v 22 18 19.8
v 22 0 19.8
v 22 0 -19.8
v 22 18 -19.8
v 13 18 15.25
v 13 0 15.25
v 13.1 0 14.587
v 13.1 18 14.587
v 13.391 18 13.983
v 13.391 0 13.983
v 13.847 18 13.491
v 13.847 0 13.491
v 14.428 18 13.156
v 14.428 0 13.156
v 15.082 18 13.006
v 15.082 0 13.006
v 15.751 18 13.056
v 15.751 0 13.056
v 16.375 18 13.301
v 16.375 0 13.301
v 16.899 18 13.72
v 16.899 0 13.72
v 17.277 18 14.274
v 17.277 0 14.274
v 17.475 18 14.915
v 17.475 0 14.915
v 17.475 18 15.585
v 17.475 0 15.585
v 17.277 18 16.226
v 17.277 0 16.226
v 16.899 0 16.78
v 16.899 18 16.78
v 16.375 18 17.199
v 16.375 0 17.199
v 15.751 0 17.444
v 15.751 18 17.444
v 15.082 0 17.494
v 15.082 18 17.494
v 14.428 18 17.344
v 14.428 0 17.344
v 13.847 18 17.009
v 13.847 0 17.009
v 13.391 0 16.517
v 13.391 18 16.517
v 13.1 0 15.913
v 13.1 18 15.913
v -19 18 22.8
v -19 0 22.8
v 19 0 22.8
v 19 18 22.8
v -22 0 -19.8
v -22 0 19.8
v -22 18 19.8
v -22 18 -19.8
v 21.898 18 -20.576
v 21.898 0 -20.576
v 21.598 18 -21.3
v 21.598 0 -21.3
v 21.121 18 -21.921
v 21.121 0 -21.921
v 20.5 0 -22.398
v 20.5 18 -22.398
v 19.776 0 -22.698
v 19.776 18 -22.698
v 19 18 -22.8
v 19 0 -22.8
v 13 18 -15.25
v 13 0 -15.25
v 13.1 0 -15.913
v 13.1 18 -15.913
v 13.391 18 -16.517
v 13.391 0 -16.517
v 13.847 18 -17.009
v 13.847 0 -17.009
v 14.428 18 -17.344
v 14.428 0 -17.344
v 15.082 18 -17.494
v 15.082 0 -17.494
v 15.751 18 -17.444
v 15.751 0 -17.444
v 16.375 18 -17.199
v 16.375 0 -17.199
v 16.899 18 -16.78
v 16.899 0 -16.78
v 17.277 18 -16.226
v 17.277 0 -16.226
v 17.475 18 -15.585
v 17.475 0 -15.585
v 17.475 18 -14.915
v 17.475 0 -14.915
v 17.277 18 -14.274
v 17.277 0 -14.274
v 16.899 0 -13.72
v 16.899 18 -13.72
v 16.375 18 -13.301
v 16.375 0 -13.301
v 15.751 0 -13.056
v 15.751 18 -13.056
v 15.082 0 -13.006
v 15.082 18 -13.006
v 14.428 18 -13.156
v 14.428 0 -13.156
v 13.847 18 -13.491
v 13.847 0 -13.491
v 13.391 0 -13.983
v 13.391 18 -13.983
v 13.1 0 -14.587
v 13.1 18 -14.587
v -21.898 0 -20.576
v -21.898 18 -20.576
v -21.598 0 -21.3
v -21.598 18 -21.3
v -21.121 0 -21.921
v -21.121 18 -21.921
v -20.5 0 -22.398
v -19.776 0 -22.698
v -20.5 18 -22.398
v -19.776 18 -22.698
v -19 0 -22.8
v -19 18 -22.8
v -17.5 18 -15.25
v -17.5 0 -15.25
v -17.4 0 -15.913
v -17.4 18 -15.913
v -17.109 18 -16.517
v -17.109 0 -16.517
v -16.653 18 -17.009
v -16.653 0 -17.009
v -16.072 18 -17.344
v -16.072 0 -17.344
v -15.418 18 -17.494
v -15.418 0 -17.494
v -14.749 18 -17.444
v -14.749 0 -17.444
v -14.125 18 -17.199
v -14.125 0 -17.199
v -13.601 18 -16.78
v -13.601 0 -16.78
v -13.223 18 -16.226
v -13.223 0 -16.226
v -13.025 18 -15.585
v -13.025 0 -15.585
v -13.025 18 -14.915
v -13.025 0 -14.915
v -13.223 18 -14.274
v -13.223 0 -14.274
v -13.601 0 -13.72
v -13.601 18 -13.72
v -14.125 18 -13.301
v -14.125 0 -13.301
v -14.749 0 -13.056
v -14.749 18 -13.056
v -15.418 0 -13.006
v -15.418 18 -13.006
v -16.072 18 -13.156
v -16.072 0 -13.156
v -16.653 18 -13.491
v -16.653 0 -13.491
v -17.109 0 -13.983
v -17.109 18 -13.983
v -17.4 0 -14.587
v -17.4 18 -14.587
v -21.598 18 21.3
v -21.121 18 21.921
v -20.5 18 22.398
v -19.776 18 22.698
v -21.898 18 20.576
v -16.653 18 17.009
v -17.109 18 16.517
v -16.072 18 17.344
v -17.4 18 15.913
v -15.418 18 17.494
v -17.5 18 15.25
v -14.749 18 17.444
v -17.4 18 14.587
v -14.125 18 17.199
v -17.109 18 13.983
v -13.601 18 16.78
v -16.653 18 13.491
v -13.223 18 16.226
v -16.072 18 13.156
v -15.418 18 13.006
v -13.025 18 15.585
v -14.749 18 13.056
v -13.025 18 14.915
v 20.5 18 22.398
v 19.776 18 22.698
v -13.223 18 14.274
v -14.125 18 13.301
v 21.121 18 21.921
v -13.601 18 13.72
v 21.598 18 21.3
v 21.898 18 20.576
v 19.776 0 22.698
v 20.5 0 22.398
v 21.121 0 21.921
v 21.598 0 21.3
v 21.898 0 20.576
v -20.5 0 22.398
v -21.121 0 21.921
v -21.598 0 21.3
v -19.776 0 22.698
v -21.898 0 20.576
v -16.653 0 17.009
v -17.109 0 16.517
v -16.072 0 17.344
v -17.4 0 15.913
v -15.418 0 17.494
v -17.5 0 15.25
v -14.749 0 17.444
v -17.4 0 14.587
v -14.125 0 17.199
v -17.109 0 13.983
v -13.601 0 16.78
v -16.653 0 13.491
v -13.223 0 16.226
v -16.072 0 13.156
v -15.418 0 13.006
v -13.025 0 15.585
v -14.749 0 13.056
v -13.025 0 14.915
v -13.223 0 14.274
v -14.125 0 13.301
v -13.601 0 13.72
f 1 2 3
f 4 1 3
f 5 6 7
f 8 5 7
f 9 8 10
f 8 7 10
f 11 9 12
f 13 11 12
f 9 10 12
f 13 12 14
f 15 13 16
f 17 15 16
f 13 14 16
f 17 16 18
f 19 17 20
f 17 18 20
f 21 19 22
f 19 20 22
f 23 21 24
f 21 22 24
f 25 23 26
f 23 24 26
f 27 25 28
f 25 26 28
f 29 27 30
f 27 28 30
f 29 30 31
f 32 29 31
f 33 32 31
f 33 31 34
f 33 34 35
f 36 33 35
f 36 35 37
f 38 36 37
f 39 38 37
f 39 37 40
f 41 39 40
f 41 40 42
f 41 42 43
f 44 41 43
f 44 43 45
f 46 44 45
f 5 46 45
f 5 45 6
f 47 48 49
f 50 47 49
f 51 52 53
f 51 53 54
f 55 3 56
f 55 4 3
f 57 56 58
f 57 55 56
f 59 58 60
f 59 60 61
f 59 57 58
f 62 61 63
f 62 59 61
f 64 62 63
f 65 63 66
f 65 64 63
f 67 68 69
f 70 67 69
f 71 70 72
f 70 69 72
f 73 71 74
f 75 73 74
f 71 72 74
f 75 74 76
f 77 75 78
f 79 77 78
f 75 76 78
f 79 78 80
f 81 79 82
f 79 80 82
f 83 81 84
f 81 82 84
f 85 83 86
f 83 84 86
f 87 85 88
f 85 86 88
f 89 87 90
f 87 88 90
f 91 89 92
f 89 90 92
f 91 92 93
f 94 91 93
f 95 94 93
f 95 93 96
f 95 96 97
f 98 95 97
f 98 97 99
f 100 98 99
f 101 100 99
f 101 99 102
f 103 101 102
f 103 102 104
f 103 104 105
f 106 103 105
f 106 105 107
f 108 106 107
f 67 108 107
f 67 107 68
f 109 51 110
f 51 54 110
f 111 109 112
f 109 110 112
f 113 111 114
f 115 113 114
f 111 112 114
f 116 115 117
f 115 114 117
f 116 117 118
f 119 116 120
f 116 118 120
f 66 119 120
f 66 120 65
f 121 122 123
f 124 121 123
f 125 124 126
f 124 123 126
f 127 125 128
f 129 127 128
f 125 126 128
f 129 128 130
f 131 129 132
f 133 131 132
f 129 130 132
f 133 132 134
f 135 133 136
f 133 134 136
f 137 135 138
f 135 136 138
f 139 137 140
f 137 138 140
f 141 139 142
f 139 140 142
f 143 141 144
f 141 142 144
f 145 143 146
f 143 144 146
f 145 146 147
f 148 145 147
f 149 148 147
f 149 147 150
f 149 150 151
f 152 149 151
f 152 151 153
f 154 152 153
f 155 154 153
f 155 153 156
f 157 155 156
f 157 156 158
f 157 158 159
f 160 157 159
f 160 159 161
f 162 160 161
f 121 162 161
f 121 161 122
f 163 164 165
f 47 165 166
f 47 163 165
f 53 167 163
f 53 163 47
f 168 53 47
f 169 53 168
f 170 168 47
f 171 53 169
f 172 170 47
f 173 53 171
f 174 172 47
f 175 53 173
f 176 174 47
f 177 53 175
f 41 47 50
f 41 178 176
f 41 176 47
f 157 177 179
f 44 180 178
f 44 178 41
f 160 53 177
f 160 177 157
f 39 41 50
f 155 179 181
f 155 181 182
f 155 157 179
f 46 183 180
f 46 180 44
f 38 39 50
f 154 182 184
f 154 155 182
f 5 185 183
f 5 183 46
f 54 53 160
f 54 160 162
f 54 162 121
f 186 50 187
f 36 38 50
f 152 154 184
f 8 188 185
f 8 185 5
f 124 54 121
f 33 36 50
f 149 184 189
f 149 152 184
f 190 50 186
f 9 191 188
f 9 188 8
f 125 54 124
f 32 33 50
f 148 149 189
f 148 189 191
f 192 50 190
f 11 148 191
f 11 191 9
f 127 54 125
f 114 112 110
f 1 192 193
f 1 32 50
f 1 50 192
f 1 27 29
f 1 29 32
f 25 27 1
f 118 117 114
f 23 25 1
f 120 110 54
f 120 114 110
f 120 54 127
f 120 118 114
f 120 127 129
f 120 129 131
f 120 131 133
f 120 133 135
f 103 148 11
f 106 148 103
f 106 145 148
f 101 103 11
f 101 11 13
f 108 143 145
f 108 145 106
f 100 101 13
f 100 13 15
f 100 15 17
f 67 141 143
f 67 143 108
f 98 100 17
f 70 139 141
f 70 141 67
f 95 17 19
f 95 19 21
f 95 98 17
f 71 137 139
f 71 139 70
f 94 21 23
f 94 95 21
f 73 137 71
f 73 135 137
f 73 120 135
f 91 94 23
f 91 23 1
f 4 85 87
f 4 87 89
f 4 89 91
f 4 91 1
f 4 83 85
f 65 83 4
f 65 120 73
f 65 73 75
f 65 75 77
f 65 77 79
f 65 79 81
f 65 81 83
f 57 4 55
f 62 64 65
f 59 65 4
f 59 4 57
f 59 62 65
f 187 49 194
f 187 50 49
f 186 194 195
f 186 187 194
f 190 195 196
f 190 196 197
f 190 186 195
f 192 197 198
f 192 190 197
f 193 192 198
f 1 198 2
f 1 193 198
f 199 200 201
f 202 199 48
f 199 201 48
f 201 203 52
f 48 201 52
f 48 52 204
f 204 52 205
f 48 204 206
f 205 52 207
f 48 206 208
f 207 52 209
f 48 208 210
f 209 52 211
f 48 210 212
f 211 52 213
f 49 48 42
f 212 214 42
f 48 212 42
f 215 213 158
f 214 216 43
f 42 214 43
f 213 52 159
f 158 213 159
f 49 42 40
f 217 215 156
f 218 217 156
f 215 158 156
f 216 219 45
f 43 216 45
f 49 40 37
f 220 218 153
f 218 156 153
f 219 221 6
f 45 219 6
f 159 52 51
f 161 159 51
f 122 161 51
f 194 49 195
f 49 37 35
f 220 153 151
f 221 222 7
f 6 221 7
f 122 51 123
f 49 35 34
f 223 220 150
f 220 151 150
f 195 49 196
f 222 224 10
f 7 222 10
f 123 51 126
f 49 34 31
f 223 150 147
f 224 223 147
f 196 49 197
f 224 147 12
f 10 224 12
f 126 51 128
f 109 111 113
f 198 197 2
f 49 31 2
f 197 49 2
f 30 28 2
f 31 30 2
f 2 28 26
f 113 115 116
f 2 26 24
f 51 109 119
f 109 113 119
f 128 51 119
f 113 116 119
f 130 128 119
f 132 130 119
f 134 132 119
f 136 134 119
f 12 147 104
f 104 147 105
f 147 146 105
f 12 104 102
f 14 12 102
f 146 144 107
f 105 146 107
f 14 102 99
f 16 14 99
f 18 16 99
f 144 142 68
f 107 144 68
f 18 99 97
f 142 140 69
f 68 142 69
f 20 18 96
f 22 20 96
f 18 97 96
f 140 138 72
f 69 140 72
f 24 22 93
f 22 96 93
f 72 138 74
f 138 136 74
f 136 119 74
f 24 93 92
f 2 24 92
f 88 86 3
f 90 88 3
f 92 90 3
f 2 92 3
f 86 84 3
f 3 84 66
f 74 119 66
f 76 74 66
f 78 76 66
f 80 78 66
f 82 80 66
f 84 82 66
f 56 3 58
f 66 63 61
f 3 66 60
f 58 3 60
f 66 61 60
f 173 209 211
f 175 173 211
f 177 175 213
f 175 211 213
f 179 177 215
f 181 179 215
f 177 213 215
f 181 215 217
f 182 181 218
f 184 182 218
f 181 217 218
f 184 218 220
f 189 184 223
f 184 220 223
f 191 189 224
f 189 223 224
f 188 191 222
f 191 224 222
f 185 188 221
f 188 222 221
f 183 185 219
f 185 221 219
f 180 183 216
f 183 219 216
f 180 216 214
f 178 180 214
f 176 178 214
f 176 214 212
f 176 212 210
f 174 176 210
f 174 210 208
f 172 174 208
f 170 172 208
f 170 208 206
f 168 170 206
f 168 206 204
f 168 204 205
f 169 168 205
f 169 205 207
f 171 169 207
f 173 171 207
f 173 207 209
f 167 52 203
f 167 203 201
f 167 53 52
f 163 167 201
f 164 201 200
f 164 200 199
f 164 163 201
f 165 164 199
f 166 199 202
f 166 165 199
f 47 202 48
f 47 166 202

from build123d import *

# Parameters (mm, degrees)
SKETCH1_W            = 44
SKETCH1_H            = 45.6
BOSS_EXTRUDE1_DEPTH  = 18
FILLET1_R            = 3
M4_CLEARANCE_HOLE1_D = 4.5


with BuildPart() as part:
    # Sketch1 → Boss-Extrude1 (new body)
    with BuildSketch(Plane(origin=(0, 0, 0), x_dir=(1, 0, 0), z_dir=(0, 1, 0))):
        Rectangle(SKETCH1_W, SKETCH1_H)
    extrude(amount=BOSS_EXTRUDE1_DEPTH)

    # Fillet1
    fillet1_edges = [part.edges().sort_by_distance(p)[0] for p in [
        (22, 9, 22.8),
        (-22, 9, 22.8),
        (-22, 9, -22.8),
        (22, 9, -22.8),
    ]]
    fillet(fillet1_edges, radius=FILLET1_R)

    # M4 Clearance Hole1 (through all)
    with Locations(Plane(origin=(0, 18, 0), x_dir=(1, 0, 0), z_dir=(0, 1, 0))):
        with Locations((15.25, -15.25), (-15.25, 15.25), (-15.25, -15.25), (15.25, 15.25)):
            Hole(M4_CLEARANCE_HOLE1_D / 2)


solid = part.part
